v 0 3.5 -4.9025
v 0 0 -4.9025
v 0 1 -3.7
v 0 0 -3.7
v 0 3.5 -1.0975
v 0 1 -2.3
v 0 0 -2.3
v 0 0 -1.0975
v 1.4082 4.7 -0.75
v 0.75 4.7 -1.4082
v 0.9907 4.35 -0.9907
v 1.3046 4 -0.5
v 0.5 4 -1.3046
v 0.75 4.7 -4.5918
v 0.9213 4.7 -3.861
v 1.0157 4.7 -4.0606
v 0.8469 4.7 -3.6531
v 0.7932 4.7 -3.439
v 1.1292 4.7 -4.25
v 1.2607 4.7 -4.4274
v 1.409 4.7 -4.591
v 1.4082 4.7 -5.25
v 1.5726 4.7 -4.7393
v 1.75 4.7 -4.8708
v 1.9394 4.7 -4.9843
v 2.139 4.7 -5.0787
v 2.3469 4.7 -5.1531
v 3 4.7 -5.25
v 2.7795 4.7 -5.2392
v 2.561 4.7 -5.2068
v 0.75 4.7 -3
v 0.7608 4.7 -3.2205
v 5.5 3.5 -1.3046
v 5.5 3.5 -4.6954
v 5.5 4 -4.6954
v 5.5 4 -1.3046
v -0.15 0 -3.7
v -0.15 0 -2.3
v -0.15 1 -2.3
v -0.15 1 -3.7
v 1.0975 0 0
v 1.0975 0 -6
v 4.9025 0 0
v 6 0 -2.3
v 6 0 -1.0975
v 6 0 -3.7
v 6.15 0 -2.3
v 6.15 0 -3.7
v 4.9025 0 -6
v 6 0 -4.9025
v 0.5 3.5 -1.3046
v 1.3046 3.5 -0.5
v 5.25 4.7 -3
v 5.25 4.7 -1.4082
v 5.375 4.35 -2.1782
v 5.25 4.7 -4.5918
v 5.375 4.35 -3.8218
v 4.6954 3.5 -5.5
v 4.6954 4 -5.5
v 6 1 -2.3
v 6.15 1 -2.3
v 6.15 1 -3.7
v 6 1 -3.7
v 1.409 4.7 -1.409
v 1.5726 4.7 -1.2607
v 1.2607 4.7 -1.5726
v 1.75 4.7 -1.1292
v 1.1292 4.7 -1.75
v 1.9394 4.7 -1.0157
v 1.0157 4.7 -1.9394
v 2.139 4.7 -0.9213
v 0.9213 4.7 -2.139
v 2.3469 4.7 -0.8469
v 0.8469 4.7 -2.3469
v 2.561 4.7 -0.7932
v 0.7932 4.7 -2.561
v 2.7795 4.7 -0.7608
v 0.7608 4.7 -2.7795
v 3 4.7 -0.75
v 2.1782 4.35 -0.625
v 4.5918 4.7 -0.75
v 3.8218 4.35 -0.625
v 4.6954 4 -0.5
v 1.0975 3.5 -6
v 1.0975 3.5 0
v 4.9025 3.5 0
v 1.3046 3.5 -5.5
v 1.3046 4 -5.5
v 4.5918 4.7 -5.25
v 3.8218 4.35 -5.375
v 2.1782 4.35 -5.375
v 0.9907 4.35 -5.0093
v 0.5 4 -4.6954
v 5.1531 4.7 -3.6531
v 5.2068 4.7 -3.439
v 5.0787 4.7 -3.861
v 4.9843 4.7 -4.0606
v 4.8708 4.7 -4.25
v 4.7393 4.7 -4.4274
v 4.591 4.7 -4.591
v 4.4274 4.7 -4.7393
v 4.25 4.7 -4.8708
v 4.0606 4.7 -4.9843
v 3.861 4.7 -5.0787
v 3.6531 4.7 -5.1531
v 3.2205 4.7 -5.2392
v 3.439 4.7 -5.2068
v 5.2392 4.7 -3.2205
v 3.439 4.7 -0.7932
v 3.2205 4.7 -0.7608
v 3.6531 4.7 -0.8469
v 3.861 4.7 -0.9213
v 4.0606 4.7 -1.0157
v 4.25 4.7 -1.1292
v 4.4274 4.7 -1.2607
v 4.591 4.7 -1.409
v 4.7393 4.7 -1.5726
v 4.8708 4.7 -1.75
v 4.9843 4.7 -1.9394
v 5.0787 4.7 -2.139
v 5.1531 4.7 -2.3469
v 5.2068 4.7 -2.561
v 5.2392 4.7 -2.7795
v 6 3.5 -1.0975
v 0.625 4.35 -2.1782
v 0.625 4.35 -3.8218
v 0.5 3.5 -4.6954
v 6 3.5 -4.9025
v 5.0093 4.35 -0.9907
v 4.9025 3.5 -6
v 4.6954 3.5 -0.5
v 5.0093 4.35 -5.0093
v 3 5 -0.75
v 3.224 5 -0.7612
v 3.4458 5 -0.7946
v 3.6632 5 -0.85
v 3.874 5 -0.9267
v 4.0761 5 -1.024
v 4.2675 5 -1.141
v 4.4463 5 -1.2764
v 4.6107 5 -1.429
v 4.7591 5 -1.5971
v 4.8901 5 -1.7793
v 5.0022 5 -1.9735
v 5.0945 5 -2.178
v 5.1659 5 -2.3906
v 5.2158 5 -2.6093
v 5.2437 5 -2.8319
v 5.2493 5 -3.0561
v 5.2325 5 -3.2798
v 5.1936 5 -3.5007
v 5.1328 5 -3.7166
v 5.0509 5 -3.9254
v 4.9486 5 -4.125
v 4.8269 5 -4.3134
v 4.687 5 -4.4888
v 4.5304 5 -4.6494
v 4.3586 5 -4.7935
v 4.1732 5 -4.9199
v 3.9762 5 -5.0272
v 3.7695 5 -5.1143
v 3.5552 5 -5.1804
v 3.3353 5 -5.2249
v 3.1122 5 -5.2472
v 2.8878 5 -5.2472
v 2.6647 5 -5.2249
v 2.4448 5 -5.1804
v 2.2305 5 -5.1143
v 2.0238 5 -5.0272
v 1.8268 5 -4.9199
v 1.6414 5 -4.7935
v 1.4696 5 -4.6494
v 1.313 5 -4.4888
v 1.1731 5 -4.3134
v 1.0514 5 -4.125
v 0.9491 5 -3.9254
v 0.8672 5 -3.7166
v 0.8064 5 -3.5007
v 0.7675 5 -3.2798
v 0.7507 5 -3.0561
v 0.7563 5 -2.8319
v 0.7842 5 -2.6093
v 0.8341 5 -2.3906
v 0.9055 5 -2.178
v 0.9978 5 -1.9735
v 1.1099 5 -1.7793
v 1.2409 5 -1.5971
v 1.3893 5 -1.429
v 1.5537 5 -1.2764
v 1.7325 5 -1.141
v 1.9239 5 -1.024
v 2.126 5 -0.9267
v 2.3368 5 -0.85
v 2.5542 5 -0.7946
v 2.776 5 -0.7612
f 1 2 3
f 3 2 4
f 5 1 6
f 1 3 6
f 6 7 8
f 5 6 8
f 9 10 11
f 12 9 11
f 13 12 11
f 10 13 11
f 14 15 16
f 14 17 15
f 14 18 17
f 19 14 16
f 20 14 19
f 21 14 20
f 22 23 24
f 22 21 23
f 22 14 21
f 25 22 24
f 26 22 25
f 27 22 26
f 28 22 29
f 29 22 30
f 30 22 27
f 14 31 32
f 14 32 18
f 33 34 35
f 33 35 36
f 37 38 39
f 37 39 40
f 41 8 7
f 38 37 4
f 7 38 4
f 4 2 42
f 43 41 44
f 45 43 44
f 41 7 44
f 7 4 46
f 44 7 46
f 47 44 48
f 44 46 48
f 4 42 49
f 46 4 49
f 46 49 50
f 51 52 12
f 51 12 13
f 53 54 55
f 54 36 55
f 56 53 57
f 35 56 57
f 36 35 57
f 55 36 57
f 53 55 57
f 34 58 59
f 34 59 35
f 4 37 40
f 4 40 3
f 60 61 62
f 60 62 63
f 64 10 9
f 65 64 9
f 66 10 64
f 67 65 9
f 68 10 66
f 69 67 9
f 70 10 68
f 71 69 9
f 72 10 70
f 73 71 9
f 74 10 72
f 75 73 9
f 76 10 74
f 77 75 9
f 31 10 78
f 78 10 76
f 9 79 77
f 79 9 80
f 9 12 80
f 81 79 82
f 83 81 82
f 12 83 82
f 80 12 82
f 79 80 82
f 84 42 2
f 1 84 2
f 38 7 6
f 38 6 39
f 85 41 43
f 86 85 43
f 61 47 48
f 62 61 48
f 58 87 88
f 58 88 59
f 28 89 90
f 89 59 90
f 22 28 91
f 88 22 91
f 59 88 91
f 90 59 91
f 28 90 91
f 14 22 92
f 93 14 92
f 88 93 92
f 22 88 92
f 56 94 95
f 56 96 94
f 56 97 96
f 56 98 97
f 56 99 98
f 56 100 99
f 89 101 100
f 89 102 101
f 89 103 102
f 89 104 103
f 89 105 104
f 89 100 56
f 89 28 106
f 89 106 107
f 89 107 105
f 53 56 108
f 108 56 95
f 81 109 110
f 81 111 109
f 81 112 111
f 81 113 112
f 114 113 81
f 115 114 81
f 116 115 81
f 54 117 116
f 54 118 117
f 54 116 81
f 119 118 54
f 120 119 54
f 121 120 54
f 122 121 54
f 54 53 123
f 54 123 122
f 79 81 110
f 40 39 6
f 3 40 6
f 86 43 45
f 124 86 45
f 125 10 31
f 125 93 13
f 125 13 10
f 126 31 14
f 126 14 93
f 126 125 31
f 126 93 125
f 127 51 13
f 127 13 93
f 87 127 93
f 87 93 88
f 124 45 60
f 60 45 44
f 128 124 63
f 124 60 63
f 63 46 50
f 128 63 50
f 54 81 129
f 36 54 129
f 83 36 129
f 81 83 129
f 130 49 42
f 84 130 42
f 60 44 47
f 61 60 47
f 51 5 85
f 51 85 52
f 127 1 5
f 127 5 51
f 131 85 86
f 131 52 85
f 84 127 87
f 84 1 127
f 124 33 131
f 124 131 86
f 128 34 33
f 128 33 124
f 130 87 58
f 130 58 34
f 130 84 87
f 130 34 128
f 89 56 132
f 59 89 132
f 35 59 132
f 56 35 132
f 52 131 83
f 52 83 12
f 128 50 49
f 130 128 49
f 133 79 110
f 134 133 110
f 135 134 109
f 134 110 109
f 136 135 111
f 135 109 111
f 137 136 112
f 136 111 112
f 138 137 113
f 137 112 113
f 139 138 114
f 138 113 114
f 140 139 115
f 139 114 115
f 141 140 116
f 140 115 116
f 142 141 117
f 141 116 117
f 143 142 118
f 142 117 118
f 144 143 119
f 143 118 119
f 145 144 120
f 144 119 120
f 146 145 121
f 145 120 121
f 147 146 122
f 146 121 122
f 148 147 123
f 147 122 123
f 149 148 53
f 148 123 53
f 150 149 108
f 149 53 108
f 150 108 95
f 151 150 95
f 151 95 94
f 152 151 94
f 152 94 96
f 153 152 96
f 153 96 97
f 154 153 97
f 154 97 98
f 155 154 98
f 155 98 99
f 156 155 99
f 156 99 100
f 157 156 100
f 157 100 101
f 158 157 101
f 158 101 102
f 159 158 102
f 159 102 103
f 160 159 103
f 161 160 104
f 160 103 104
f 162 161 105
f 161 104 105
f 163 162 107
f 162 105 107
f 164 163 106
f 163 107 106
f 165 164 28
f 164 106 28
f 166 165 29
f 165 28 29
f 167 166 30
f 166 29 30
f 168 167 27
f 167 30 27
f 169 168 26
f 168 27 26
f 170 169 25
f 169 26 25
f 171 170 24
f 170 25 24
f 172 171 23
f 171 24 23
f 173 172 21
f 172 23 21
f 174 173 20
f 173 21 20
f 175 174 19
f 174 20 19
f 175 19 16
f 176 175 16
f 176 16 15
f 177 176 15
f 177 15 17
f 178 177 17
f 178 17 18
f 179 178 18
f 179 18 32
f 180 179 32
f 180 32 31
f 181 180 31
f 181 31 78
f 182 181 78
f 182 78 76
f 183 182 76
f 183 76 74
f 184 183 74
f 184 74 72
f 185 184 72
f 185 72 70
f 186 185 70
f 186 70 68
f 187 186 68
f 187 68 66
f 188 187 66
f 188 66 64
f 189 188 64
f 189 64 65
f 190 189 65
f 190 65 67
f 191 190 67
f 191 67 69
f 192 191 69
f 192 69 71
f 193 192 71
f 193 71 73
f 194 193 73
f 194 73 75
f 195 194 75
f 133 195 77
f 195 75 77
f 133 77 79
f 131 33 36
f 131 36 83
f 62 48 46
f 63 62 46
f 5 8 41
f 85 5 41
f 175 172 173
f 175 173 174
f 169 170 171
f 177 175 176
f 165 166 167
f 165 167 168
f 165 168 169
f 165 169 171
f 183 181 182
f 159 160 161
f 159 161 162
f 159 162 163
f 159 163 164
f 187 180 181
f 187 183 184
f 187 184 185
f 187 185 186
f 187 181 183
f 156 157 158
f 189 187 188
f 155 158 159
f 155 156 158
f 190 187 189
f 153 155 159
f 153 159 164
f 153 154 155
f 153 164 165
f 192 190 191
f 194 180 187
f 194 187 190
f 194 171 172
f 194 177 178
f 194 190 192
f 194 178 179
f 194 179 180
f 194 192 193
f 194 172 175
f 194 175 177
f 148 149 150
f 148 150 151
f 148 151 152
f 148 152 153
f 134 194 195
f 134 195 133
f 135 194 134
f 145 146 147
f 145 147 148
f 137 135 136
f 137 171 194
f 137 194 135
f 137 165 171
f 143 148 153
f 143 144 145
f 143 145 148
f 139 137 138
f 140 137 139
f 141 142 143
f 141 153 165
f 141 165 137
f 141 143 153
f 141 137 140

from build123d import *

# Parameters (mm, degrees)
EXTRUDE_1_DEPTH = 3.5
EXTRUDE_2_DEPTH = 0.5
EXTRUDE_3_DEPTH = 0.7
SKETCH_4_R      = 2.25
EXTRUDE_4_DEPTH = 0.3
EXTRUDE_5_DEPTH = 1


with BuildPart() as part:
    # 草图1 → 凸台-拉伸1 (new body)
    with BuildSketch(Plane(origin=(0, 0, 0), x_dir=(1, 0, 0), z_dir=(0, 1, 0))):
        Polygon((0, 4.902463921), (0, 1.097536079), (0.55, 0.547536079), (1.097536079, 0), (4.902463921, 0), (5.45, 0.547536079), (6, 1.097536079), (6, 4.902463921), (5.45, 5.452463921), (4.902463921, 6), (1.097536079, 6), (0.55, 5.452463921), align=None)
    extrude(amount=EXTRUDE_1_DEPTH)

    # 草图2 → 凸台-拉伸2 (add)
    with BuildSketch(Plane(origin=(0, 3.5, 0), x_dir=(1, 0, 0), z_dir=(0, 1, 0))):
        Polygon((1.30464286, 5.5), (4.69535714, 5.5), (5.5, 4.69535714), (5.5, 1.30464286), (4.69535714, 0.5), (1.30464286, 0.5), (0.5, 1.30464286), (0.5, 4.69535714), align=None)
    extrude(amount=EXTRUDE_2_DEPTH)

    # 草图3 → 凸台-拉伸3 (add)
    with BuildSketch(Plane(origin=(0, 4, 0), x_dir=(1, 0, 0), z_dir=(0, 1, 0))):
        Polygon((4.591803749, 5.25), (1.408196251, 5.25), (0.75, 4.591803749), (0.75, 1.408196251), (1.408196251, 0.75), (4.591803749, 0.75), (5.25, 1.408196251), (5.25, 4.591803749), align=None)
    extrude(amount=EXTRUDE_3_DEPTH)

    # 草图4 → 凸台-拉伸4 (add)
    with BuildSketch(Plane(origin=(0, 4.7, 0), x_dir=(1, 0, 0), z_dir=(0, 1, 0))):
        with Locations(Location((3, 3, 0), (0, 0, 270))):
            Circle(SKETCH_4_R)
    extrude(amount=EXTRUDE_4_DEPTH)

    # 放样2: read off the stored shape, not the designer's step
    # 放样2: loft between two sections, ruled curve by curve
    loft_2_from = [
        Edge.make_line((1.408196251, 4.7, -5.25), (0.75, 4.7, -4.591803749)),
        Edge.make_line((5.25, 4.7, -4.591803749), (4.591803749, 4.7, -5.25)),
        Edge.make_line((4.591803749, 4.7, -0.75), (5.25, 4.7, -1.408196251)),
        Edge.make_line((0.75, 4.7, -1.408196251), (1.408196251, 4.7, -0.75)),
        Edge.make_line((4.591803749, 4.7, -5.25), (1.408196251, 4.7, -5.25)),
        Edge.make_line((5.25, 4.7, -1.408196251), (5.25, 4.7, -4.591803749)),
        Edge.make_line((0.75, 4.7, -1.408196251), (0.75, 4.7, -4.591803749)),
        Edge.make_line((1.408196251, 4.7, -0.75), (4.591803749, 4.7, -0.75)),
    ]
    loft_2_to = [
        Edge.make_line((1.30464286, 4, -5.5), (0.5, 4, -4.69535714)),
        Edge.make_line((5.5, 4, -4.69535714), (4.69535714, 4, -5.5)),
        Edge.make_line((4.69535714, 4, -0.5), (5.5, 4, -1.30464286)),
        Edge.make_line((0.5, 4, -1.30464286), (1.30464286, 4, -0.5)),
        Edge.make_line((4.69535714, 4, -5.5), (1.30464286, 4, -5.5)),
        Edge.make_line((5.5, 4, -1.30464286), (5.5, 4, -4.69535714)),
        Edge.make_line((0.5, 4, -1.30464286), (0.5, 4, -4.69535714)),
        Edge.make_line((1.30464286, 4, -0.5), (4.69535714, 4, -0.5)),
    ]
    loft_2 = Solid(Shell([*[Face.make_surface_from_curves(loft_2_from[k], loft_2_to[k]) for k in range(8)], Face(Wire(loft_2_from)), Face(Wire(loft_2_to))]))
    add(loft_2)

    # 草图5 → 凸台-拉伸5 (add)
    with BuildSketch(Plane.XZ):
        Polygon((0, -3), (0, -2.3), (-0.15, -2.3), (-0.15, -3.7), (0, -3.7), align=None)
        Polygon((6, -3), (6, -2.3), (6.15, -2.3), (6.15, -3.7), (6, -3.7), align=None)
    extrude(amount=-EXTRUDE_5_DEPTH)


solid = part.part
